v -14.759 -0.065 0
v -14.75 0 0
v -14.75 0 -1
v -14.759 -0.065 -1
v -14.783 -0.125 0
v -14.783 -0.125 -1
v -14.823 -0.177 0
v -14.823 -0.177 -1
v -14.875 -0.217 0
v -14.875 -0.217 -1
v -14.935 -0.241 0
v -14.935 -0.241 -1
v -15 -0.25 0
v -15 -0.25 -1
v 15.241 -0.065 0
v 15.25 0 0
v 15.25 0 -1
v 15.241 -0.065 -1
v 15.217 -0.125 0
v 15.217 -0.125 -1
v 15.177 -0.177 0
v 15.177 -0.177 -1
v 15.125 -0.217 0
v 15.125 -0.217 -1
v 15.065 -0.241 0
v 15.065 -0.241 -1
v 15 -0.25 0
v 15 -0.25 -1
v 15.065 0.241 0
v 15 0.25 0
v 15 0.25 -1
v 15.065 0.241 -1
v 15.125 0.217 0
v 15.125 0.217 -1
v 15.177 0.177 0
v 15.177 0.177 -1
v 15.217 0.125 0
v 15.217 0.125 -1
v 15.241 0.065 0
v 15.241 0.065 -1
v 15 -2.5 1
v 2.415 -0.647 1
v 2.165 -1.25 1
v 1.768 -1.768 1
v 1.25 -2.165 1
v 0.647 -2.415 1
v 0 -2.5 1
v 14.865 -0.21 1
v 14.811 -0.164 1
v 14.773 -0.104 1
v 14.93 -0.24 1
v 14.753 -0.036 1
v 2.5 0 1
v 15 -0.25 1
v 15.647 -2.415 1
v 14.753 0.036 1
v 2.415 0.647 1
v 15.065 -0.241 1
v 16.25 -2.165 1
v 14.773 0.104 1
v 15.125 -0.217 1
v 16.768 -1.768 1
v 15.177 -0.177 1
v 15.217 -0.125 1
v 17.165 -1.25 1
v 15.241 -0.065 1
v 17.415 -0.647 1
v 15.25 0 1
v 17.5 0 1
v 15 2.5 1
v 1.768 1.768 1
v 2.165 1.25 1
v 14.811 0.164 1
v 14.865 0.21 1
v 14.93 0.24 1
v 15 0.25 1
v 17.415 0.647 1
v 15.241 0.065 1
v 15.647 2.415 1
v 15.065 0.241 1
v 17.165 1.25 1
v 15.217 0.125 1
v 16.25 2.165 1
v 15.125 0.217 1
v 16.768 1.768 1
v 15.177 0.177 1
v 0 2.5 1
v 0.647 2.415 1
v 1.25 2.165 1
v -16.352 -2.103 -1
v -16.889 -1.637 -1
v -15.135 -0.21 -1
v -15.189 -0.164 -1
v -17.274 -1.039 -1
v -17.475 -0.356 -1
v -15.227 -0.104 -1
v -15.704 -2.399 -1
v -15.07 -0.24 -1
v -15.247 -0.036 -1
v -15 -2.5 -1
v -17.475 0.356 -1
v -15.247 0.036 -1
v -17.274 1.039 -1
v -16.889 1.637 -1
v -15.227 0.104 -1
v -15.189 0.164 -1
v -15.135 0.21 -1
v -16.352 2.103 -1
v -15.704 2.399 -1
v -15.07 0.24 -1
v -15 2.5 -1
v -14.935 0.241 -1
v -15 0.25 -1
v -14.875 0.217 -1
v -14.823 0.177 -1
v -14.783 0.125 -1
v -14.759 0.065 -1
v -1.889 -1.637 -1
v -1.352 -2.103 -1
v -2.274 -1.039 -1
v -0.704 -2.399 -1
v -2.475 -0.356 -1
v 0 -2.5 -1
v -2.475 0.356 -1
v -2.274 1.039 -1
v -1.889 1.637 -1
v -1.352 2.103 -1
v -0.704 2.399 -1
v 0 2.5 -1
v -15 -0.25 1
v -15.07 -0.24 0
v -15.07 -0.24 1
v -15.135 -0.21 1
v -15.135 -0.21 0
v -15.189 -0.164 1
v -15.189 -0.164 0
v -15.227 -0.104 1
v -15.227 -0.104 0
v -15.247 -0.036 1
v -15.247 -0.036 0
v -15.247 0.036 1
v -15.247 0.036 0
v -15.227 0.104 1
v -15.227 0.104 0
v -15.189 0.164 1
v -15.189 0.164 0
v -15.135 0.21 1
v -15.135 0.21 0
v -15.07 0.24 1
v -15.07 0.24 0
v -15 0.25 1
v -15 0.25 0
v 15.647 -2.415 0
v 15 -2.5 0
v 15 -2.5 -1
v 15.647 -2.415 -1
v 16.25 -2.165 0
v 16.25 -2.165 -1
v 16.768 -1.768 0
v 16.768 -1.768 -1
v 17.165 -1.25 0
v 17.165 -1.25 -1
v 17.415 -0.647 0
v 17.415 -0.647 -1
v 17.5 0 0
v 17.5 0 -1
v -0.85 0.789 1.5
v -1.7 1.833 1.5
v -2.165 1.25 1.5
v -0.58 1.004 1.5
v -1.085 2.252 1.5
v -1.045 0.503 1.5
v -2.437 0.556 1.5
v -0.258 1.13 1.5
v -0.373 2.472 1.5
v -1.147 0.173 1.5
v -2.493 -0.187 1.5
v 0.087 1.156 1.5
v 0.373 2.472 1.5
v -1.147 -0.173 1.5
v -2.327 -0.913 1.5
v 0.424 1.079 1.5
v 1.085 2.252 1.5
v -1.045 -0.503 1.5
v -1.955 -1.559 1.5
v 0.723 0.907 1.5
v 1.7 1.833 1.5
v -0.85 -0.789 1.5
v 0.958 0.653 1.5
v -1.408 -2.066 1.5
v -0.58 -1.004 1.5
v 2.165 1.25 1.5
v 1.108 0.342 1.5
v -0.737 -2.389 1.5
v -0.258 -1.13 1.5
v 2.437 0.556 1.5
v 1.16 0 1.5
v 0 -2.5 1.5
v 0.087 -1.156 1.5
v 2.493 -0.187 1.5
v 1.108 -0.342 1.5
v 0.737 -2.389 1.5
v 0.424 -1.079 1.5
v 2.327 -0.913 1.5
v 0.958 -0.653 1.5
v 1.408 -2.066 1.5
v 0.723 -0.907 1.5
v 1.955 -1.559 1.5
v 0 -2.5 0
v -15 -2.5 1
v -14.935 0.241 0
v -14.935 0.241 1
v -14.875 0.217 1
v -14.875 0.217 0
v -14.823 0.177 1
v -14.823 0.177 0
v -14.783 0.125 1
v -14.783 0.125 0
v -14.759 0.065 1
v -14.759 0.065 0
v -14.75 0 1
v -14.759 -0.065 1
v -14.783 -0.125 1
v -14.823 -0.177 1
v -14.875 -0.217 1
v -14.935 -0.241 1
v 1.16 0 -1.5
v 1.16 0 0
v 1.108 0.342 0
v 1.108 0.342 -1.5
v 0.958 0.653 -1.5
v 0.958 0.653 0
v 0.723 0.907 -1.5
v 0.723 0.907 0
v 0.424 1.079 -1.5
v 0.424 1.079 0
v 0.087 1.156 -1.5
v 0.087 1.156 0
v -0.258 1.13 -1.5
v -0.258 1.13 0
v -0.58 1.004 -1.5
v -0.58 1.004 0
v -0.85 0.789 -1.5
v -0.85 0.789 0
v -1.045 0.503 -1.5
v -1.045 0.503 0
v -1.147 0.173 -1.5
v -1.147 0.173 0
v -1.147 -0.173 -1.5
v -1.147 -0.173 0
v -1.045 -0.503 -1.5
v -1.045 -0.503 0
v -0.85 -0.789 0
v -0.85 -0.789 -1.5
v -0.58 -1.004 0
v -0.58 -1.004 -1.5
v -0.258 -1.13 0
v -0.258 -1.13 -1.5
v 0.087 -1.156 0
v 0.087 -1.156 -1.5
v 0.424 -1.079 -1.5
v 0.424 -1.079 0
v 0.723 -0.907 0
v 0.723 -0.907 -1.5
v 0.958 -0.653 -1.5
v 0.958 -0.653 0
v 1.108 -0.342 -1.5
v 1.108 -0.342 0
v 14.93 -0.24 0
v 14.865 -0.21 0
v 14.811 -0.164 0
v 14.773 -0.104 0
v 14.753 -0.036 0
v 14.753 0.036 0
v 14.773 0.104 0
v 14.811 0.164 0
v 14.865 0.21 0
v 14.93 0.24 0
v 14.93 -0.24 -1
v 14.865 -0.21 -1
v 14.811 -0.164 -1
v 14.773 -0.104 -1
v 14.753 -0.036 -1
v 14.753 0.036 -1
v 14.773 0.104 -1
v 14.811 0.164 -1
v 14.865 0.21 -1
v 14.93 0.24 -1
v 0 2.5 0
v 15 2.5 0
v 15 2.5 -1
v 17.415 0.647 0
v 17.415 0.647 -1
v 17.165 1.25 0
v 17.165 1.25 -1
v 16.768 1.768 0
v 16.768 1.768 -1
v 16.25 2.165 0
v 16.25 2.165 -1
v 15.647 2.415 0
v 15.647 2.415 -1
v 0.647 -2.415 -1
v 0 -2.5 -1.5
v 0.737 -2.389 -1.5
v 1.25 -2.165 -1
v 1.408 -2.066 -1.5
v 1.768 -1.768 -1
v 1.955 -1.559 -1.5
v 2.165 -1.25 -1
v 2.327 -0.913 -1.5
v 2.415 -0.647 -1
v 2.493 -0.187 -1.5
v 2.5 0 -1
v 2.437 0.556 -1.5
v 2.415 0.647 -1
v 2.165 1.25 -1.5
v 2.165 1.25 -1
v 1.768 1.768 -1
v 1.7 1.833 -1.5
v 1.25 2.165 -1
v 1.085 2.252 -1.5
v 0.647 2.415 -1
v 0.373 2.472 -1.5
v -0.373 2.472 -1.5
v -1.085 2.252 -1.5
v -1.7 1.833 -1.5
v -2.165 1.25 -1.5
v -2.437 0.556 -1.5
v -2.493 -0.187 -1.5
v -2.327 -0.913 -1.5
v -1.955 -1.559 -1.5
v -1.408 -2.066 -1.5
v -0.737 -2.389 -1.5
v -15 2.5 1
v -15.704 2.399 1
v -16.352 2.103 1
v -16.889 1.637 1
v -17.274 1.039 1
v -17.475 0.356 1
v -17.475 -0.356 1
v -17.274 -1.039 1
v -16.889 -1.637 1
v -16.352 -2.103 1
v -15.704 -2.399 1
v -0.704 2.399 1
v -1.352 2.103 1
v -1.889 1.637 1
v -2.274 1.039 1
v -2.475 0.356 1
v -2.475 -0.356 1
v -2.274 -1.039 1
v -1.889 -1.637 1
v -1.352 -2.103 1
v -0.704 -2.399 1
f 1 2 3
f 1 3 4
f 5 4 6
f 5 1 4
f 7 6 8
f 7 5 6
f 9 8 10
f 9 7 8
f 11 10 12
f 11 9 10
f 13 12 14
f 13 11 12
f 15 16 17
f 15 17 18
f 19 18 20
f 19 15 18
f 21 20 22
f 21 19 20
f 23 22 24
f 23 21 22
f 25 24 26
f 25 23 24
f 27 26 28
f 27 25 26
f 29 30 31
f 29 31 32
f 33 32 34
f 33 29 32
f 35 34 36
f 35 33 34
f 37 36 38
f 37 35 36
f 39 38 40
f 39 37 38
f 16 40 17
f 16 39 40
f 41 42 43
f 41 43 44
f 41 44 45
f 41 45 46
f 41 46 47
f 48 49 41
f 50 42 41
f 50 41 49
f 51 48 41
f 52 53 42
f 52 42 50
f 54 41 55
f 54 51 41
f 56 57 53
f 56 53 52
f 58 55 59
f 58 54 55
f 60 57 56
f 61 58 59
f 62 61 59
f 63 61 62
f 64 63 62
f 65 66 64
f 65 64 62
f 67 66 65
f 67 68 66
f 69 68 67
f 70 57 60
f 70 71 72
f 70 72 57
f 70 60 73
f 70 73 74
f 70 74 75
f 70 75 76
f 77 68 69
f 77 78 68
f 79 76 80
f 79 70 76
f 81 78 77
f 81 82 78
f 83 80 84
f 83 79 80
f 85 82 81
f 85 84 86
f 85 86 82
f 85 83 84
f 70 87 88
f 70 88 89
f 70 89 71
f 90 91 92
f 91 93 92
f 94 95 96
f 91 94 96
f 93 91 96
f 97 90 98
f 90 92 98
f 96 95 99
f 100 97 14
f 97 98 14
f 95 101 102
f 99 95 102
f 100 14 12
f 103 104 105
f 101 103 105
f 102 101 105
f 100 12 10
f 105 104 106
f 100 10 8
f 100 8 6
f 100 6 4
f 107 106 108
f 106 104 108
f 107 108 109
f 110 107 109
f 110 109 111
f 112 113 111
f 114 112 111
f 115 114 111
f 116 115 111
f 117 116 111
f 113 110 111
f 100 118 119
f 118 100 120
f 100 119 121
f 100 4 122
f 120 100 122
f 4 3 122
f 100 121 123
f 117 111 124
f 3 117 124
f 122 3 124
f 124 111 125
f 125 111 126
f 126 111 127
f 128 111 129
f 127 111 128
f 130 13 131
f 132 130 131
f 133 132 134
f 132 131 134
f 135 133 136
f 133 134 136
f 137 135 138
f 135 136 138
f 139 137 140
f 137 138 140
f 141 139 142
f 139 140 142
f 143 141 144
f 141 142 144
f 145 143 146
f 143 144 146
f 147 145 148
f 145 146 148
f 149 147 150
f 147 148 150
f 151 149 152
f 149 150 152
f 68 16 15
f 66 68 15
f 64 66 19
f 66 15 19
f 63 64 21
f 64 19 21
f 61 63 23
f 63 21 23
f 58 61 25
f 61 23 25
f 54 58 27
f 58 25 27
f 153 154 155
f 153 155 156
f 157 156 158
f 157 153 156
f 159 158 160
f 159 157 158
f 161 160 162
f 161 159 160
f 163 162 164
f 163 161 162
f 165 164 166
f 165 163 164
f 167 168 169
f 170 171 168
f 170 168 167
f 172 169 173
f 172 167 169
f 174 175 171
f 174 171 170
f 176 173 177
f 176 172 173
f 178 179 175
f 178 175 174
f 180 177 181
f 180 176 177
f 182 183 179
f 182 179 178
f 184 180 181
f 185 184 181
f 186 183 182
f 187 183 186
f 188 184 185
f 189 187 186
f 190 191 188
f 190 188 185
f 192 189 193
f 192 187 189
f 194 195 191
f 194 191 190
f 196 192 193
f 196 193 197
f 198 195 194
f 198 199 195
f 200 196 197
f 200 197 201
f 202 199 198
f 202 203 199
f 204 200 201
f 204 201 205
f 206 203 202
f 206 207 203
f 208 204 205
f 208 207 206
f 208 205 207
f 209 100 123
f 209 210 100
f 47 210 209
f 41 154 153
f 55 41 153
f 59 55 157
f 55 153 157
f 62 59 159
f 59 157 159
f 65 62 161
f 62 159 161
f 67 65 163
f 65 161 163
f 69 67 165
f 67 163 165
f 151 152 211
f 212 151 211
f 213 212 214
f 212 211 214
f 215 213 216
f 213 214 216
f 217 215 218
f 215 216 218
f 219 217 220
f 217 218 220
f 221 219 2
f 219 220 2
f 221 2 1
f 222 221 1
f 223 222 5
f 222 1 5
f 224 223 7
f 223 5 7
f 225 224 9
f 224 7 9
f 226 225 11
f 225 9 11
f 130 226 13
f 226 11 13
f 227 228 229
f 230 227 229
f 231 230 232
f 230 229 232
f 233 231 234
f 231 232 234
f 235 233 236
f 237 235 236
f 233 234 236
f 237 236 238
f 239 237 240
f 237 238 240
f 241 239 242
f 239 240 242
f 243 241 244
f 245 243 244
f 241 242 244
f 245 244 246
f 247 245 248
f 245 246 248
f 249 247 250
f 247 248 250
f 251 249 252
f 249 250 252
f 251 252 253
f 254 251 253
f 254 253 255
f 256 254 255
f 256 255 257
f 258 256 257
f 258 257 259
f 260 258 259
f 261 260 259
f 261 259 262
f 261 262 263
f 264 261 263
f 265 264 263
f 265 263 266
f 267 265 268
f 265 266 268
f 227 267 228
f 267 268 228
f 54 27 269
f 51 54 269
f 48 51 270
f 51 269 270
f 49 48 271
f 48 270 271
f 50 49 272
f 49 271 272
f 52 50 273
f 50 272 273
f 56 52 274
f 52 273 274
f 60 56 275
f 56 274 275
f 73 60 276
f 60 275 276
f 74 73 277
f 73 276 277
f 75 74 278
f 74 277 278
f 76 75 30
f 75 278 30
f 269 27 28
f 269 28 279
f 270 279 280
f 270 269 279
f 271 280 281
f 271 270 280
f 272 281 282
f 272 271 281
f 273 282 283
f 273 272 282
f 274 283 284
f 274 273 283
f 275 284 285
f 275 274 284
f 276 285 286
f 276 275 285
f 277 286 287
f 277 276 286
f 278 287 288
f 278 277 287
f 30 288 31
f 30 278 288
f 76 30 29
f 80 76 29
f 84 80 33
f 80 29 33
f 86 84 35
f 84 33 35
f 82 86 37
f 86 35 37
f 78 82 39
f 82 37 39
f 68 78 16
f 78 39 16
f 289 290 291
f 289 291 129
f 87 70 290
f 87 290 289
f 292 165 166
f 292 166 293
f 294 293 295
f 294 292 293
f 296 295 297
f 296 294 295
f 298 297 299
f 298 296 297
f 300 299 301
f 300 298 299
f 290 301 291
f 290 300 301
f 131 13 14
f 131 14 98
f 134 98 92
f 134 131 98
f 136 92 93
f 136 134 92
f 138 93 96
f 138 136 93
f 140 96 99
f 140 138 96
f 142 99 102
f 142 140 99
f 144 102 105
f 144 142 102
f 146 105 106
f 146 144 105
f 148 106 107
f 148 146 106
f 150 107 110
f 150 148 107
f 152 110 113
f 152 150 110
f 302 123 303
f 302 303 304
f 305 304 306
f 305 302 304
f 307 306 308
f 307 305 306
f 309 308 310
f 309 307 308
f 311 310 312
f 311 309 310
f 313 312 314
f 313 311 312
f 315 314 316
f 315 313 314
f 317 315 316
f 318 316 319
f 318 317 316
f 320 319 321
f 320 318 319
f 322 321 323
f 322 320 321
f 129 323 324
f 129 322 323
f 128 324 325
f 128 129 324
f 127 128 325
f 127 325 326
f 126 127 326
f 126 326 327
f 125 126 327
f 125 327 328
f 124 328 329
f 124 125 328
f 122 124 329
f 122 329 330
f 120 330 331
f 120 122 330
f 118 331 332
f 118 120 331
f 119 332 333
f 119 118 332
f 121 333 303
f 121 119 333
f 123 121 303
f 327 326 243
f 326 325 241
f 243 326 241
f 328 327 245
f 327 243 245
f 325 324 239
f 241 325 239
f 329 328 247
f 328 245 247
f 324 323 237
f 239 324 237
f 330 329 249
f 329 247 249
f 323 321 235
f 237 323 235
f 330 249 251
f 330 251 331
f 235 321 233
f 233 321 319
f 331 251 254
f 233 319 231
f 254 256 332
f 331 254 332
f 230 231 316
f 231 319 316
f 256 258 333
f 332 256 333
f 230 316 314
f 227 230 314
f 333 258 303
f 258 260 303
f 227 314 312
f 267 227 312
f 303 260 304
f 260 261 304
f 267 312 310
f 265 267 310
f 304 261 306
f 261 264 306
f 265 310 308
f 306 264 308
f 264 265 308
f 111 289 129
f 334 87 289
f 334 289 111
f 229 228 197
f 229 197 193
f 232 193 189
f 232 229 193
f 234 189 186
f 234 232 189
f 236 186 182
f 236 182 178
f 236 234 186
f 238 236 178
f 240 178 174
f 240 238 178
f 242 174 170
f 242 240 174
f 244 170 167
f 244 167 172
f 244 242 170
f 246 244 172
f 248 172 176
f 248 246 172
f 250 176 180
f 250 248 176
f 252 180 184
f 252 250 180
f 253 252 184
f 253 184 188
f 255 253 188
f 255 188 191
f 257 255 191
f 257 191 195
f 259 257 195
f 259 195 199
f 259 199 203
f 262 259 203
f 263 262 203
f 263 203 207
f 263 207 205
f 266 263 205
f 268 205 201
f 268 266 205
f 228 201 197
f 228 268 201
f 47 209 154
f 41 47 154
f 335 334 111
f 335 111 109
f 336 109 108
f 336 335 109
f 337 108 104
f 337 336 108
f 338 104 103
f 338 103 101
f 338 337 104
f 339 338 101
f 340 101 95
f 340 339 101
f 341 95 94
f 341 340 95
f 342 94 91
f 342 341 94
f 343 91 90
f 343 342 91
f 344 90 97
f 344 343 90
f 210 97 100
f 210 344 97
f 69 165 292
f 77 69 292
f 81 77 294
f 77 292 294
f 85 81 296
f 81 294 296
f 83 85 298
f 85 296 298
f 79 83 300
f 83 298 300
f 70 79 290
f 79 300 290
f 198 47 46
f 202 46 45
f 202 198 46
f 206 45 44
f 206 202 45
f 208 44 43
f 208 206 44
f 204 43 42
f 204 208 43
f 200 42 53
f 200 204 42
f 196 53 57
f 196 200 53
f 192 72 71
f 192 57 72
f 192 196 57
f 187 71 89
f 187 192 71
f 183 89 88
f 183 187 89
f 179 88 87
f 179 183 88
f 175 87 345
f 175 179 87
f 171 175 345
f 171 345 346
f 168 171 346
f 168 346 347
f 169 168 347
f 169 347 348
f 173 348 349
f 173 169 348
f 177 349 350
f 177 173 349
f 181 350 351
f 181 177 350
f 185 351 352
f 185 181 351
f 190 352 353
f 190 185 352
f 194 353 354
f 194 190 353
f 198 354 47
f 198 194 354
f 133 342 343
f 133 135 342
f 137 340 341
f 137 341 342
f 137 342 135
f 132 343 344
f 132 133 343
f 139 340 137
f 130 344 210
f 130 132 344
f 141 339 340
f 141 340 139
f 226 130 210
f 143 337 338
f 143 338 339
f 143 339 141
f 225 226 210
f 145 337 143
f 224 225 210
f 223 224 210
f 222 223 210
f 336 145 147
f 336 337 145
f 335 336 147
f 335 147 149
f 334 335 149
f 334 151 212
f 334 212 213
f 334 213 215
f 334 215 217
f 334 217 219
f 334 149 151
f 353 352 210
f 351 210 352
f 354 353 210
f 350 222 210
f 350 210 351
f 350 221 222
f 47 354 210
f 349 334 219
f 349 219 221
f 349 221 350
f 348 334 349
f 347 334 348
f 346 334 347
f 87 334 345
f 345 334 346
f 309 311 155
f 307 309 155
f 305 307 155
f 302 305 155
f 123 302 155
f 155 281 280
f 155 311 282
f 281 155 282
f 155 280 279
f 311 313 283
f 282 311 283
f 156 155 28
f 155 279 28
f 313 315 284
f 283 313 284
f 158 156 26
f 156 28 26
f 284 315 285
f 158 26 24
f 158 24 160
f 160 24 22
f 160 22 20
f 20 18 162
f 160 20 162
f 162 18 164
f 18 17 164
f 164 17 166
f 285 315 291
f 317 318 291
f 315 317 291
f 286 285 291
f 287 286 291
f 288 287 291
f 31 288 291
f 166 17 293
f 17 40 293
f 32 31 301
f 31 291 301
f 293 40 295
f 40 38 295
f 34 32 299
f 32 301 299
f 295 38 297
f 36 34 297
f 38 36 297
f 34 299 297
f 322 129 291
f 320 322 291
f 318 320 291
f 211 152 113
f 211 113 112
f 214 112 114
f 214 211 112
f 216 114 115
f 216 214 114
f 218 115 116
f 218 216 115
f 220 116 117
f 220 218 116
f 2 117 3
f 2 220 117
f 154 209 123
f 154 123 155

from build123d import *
from build123d.topology import SkipClean

# Parameters (mm, degrees)
BOSS_EXTRUDE2_DEPTH = 1
SKETCH2_R           = 2.5
SKETCH2_R_2         = 1.159513831
BOSS_EXTRUDE3_DEPTH = 1.5


with BuildPart() as part:
    # Sketch1 → Boss-Extrude2 (new, symmetric)
    with BuildSketch(Plane.XY):
        with BuildLine():
            ThreePointArc((-12.5, 0), (-13.232233047, -1.767766953), (-15, -2.5))
            Line((-15, -2.5), (0, -2.5))
            ThreePointArc((0, -2.5), (-2.5, -1.2e-08), (-2.3e-08, 2.5))
            Line((-2.3e-08, 2.5), (-15, 2.5))
            ThreePointArc((-15, 2.5), (-13.232233047, 1.767766953), (-12.5, 0))
        make_face()
        with BuildLine():
            ThreePointArc((-15, 2.5), (-17.5, 0), (-15, -2.5))
            Line((-15, -2.5), (-15, -0.25))
            ThreePointArc((-15, -0.25), (-15.25, 0), (-15, 0.25))
            Line((-15, 0.25), (-15, 2.5))
        make_face()
        with BuildLine():
            Line((-15, -0.25), (-15, -2.5))
            ThreePointArc((-15, -2.5), (-13.232233047, -1.767766953), (-12.5, 0))
            ThreePointArc((-12.5, 0), (-13.232233047, 1.767766953), (-15, 2.5))
            Line((-15, 2.5), (-15, 0.25))
            ThreePointArc((-15, 0.25), (-14.823223305, 0.176776695), (-14.75, 0))
            ThreePointArc((-14.75, 0), (-14.823223305, -0.176776695), (-15, -0.25))
        make_face()
        with BuildLine():
            ThreePointArc((-15, 2.5), (-17.5, 0), (-15, -2.5))
            Line((-15, -2.5), (-15, -0.25))
            ThreePointArc((-15, -0.25), (-15.25, 0), (-15, 0.25))
            Line((-15, 0.25), (-15, 2.5))
        make_face()
        with BuildLine():
            Line((-15, -0.25), (-15, -2.5))
            ThreePointArc((-15, -2.5), (-13.232233047, -1.767766953), (-12.5, 0))
            ThreePointArc((-12.5, 0), (-13.232233047, 1.767766953), (-15, 2.5))
            Line((-15, 2.5), (-15, 0.25))
            ThreePointArc((-15, 0.25), (-14.823223305, 0.176776695), (-14.75, 0))
            ThreePointArc((-14.75, 0), (-14.823223305, -0.176776695), (-15, -0.25))
        make_face()
        with BuildLine():
            ThreePointArc((2.5, 0), (1.767766953, -1.767766953), (0, -2.5))
            Line((0, -2.5), (15, -2.5))
            ThreePointArc((15, -2.5), (12.5, 0), (15, 2.5))
            Line((15, 2.5), (-2.3e-08, 2.5))
            ThreePointArc((-2.3e-08, 2.5), (1.767766945, 1.767766961), (2.5, 0))
        make_face()
        with BuildLine():
            ThreePointArc((15, 2.5), (12.5, 0), (15, -2.5))
            Line((15, -2.5), (15, -0.25))
            ThreePointArc((15, -0.25), (14.75, 0), (15, 0.25))
            Line((15, 0.25), (15, 2.5))
        make_face()
        with BuildLine():
            Line((15, -0.25), (15, -2.5))
            ThreePointArc((15, -2.5), (16.767766953, -1.767766953), (17.5, 0))
            ThreePointArc((17.5, 0), (16.767766953, 1.767766953), (15, 2.5))
            Line((15, 2.5), (15, 0.25))
            ThreePointArc((15, 0.25), (15.176776695, 0.176776695), (15.25, 0))
            ThreePointArc((15.25, 0), (15.176776695, -0.176776695), (15, -0.25))
        make_face()
        with BuildLine():
            ThreePointArc((15, 2.5), (12.5, 0), (15, -2.5))
            Line((15, -2.5), (15, -0.25))
            ThreePointArc((15, -0.25), (14.75, 0), (15, 0.25))
            Line((15, 0.25), (15, 2.5))
        make_face()
        with BuildLine():
            Line((15, -0.25), (15, -2.5))
            ThreePointArc((15, -2.5), (16.767766953, -1.767766953), (17.5, 0))
            ThreePointArc((17.5, 0), (16.767766953, 1.767766953), (15, 2.5))
            Line((15, 2.5), (15, 0.25))
            ThreePointArc((15, 0.25), (15.176776695, 0.176776695), (15.25, 0))
            ThreePointArc((15.25, 0), (15.176776695, -0.176776695), (15, -0.25))
        make_face()
    extrude(amount=BOSS_EXTRUDE2_DEPTH, both=True)

    # Sketch2 → Boss-Extrude3 (add, symmetric)
    with SkipClean():  # the faces are left unmerged after this step: merging them gives an invalid solid
        with BuildSketch(Plane.XY):
            with Locations(Location((0, 0, 0), (0, 0, 270))):
                Circle(SKETCH2_R)
            Circle(SKETCH2_R_2, mode=Mode.SUBTRACT)
        extrude(amount=BOSS_EXTRUDE3_DEPTH, both=True)


solid = part.part
